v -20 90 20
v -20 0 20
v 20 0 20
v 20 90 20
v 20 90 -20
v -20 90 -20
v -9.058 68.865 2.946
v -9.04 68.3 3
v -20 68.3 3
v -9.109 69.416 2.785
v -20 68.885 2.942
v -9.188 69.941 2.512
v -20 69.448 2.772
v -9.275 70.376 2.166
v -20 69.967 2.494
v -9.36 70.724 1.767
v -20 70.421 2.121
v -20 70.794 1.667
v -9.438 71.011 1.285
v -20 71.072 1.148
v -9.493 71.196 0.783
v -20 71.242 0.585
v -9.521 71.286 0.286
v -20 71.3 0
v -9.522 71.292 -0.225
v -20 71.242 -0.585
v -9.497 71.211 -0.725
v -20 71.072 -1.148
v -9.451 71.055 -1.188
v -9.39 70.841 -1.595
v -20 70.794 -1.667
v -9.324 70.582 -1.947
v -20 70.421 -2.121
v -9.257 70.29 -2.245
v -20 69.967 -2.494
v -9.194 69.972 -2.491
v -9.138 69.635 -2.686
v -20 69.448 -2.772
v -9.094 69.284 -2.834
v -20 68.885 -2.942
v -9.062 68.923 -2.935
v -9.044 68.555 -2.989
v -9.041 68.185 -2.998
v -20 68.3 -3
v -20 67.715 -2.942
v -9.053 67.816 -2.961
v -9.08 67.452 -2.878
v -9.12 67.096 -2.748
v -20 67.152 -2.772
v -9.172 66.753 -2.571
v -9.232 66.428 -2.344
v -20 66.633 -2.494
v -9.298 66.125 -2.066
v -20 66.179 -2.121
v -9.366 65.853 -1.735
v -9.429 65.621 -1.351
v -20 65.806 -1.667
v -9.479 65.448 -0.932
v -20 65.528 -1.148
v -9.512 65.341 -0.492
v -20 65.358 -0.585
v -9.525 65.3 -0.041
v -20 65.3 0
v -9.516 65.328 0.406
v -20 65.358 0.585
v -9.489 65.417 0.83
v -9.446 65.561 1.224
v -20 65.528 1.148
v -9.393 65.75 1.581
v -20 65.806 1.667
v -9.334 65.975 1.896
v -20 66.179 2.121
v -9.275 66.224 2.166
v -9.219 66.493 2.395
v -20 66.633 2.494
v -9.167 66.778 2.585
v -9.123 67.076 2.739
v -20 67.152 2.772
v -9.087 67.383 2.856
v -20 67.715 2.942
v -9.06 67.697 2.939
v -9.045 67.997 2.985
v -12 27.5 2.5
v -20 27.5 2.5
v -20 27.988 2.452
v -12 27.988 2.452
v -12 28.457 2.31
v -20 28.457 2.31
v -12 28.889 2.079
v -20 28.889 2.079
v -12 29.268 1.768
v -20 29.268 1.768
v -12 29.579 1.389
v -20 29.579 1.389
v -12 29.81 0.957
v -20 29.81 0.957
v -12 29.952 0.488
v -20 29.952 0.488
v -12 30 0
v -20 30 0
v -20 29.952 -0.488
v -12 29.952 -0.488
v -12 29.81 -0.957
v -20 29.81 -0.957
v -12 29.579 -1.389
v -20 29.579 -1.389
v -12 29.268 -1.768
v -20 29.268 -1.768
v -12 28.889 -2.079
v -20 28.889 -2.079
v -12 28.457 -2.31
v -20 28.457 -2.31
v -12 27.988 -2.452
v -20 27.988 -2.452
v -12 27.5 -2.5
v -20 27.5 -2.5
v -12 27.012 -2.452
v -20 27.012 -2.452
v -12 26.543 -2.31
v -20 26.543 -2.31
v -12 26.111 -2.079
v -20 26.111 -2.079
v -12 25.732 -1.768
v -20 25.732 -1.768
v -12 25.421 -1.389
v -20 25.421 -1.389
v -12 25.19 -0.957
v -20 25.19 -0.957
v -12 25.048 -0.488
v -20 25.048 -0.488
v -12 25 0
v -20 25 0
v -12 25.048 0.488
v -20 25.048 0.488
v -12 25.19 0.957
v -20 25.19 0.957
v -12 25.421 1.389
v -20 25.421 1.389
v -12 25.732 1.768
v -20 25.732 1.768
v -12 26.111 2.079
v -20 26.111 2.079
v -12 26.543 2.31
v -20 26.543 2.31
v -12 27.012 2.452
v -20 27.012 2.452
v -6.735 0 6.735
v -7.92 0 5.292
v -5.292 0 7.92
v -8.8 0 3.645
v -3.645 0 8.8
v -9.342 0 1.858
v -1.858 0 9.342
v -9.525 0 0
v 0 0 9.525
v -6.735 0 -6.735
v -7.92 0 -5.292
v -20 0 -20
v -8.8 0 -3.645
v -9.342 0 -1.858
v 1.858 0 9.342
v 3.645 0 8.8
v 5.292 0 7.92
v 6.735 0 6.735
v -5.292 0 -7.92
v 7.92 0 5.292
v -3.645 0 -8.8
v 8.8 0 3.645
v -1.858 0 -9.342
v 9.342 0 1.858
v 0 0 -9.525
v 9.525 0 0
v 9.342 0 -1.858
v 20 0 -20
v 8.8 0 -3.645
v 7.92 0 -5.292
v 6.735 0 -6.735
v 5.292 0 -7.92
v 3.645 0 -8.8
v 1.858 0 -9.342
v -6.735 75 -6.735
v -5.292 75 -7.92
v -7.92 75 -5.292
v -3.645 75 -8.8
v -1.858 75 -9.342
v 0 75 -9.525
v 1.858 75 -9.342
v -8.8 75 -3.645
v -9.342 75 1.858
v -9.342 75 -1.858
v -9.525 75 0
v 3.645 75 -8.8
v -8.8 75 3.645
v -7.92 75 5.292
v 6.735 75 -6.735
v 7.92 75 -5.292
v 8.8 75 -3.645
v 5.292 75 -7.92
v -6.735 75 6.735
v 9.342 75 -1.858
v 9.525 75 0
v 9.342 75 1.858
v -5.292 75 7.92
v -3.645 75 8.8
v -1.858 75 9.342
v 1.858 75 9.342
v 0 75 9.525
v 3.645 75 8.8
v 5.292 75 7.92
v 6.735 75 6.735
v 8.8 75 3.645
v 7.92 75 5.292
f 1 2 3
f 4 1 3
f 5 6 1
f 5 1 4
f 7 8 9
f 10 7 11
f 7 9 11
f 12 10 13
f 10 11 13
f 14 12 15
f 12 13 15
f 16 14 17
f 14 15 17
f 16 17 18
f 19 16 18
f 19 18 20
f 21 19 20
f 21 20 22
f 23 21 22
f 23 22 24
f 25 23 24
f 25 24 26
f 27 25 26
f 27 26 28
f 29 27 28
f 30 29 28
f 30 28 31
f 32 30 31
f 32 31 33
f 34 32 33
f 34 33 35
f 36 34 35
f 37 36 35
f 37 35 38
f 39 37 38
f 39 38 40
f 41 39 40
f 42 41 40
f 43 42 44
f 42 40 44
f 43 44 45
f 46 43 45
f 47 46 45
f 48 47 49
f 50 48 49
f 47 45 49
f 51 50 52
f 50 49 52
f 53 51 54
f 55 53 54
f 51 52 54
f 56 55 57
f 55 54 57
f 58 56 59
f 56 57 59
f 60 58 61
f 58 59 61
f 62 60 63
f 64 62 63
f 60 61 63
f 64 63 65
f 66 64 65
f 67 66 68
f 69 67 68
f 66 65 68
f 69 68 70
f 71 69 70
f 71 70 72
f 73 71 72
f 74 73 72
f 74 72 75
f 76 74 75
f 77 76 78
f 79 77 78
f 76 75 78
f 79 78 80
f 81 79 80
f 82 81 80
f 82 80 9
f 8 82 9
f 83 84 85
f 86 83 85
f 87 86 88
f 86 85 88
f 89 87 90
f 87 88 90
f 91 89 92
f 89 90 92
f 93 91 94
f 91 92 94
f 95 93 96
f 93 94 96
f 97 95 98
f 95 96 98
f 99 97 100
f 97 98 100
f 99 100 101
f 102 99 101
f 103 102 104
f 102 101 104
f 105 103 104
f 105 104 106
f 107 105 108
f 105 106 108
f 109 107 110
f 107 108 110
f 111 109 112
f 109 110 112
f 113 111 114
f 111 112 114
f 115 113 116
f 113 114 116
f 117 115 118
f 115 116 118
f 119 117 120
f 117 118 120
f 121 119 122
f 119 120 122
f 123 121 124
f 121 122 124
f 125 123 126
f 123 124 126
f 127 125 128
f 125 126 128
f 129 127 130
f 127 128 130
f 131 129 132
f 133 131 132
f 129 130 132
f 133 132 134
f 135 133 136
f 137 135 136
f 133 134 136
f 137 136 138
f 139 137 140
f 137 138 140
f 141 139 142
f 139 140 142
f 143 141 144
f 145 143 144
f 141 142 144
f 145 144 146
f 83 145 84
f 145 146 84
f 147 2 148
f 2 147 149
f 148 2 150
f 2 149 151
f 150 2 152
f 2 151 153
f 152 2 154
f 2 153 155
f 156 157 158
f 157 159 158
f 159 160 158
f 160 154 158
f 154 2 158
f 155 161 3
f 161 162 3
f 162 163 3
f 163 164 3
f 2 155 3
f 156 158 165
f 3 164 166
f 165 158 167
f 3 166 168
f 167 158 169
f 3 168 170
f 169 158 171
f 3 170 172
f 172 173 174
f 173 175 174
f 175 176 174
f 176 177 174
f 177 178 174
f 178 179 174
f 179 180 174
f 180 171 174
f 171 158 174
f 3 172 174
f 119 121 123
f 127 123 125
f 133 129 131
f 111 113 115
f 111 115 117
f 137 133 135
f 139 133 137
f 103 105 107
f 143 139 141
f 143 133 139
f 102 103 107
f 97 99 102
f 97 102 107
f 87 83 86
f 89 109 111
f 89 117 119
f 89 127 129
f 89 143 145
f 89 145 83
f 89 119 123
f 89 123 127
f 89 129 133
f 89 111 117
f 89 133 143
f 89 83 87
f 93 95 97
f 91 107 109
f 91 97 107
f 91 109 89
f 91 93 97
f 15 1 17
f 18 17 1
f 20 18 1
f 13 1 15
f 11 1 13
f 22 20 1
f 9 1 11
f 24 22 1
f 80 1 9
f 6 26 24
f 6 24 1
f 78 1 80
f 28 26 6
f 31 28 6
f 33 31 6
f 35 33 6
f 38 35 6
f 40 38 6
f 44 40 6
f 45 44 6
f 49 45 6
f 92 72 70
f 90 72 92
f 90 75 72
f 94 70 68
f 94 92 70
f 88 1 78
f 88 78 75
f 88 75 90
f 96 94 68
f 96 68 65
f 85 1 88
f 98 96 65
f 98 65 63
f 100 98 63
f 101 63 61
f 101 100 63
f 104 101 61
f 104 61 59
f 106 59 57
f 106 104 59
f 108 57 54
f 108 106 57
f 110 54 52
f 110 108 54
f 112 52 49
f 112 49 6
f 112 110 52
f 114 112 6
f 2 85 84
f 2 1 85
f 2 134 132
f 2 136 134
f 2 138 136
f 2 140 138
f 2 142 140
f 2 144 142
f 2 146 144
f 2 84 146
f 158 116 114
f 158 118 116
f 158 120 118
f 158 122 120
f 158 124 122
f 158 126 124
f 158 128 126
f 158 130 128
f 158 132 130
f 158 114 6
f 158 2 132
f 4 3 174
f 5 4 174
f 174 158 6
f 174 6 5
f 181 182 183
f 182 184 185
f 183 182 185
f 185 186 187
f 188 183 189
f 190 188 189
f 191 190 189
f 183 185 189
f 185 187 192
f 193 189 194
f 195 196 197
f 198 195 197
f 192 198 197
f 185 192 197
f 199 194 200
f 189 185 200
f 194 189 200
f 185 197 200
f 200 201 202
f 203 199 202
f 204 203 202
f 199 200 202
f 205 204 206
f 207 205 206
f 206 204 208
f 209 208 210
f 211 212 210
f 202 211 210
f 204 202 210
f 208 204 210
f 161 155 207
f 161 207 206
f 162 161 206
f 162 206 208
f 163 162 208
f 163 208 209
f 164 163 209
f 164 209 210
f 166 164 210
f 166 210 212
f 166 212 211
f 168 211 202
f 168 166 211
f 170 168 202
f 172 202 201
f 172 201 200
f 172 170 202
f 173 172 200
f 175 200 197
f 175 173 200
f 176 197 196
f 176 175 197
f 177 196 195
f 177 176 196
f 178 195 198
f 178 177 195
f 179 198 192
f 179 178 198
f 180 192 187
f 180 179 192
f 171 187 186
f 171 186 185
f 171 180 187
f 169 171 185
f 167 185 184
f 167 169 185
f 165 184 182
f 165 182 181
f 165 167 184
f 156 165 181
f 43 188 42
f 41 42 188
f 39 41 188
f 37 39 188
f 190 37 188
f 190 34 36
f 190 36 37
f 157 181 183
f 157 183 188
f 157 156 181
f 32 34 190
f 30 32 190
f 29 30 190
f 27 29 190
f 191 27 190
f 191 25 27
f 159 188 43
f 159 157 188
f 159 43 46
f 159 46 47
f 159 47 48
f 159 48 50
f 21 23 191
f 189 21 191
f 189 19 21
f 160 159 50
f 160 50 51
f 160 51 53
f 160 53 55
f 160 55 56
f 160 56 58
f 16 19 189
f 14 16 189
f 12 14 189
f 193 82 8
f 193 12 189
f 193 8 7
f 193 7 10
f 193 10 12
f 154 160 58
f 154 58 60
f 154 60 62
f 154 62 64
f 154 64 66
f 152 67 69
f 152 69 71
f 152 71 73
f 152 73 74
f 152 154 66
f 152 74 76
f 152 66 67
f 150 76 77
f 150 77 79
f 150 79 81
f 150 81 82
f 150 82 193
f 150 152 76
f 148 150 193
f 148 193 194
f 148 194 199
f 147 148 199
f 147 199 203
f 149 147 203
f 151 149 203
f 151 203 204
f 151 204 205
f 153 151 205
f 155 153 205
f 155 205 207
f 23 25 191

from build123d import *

# Parameters (mm, degrees)
SKETCH1_W           = 40
SKETCH1_H           = 40
BOSS_EXTRUDE1_DEPTH = 90
SKETCH2_R           = 9.525
CUT_EXTRUDE1_DEPTH  = 75
SKETCH3_R           = 3
CUT_EXTRUDE5_DEPTH  = 17
SKETCH5_R           = 2.5
CUT_EXTRUDE6_DEPTH  = 8


with BuildPart() as part:
    # Sketch1 → Boss-Extrude1 (new body)
    with BuildSketch(Plane(origin=(0, 0, 0), x_dir=(1, 0, 0), z_dir=(0, 1, 0))):
        Rectangle(SKETCH1_W, SKETCH1_H)
    extrude(amount=BOSS_EXTRUDE1_DEPTH)

    # Sketch2 → Cut-Extrude1 (cut)
    with BuildSketch(Plane(origin=(0, 0, 0), x_dir=(1, 0, 0), z_dir=(0, 1, 0))):
        Circle(SKETCH2_R)
    extrude(amount=CUT_EXTRUDE1_DEPTH, mode=Mode.SUBTRACT)

    # Sketch3 → Cut-Extrude5 (cut)
    with BuildSketch(Plane.ZY.offset(20)):
        with Locations((0, 68.3)):
            Circle(SKETCH3_R)
    extrude(amount=-CUT_EXTRUDE5_DEPTH, mode=Mode.SUBTRACT)

    # Sketch5 → Cut-Extrude6 (cut)
    with BuildSketch(Plane.ZY.offset(20)):
        with Locations((0, 27.5)):
            Circle(SKETCH5_R)
    extrude(amount=-CUT_EXTRUDE6_DEPTH, mode=Mode.SUBTRACT)


solid = part.part
